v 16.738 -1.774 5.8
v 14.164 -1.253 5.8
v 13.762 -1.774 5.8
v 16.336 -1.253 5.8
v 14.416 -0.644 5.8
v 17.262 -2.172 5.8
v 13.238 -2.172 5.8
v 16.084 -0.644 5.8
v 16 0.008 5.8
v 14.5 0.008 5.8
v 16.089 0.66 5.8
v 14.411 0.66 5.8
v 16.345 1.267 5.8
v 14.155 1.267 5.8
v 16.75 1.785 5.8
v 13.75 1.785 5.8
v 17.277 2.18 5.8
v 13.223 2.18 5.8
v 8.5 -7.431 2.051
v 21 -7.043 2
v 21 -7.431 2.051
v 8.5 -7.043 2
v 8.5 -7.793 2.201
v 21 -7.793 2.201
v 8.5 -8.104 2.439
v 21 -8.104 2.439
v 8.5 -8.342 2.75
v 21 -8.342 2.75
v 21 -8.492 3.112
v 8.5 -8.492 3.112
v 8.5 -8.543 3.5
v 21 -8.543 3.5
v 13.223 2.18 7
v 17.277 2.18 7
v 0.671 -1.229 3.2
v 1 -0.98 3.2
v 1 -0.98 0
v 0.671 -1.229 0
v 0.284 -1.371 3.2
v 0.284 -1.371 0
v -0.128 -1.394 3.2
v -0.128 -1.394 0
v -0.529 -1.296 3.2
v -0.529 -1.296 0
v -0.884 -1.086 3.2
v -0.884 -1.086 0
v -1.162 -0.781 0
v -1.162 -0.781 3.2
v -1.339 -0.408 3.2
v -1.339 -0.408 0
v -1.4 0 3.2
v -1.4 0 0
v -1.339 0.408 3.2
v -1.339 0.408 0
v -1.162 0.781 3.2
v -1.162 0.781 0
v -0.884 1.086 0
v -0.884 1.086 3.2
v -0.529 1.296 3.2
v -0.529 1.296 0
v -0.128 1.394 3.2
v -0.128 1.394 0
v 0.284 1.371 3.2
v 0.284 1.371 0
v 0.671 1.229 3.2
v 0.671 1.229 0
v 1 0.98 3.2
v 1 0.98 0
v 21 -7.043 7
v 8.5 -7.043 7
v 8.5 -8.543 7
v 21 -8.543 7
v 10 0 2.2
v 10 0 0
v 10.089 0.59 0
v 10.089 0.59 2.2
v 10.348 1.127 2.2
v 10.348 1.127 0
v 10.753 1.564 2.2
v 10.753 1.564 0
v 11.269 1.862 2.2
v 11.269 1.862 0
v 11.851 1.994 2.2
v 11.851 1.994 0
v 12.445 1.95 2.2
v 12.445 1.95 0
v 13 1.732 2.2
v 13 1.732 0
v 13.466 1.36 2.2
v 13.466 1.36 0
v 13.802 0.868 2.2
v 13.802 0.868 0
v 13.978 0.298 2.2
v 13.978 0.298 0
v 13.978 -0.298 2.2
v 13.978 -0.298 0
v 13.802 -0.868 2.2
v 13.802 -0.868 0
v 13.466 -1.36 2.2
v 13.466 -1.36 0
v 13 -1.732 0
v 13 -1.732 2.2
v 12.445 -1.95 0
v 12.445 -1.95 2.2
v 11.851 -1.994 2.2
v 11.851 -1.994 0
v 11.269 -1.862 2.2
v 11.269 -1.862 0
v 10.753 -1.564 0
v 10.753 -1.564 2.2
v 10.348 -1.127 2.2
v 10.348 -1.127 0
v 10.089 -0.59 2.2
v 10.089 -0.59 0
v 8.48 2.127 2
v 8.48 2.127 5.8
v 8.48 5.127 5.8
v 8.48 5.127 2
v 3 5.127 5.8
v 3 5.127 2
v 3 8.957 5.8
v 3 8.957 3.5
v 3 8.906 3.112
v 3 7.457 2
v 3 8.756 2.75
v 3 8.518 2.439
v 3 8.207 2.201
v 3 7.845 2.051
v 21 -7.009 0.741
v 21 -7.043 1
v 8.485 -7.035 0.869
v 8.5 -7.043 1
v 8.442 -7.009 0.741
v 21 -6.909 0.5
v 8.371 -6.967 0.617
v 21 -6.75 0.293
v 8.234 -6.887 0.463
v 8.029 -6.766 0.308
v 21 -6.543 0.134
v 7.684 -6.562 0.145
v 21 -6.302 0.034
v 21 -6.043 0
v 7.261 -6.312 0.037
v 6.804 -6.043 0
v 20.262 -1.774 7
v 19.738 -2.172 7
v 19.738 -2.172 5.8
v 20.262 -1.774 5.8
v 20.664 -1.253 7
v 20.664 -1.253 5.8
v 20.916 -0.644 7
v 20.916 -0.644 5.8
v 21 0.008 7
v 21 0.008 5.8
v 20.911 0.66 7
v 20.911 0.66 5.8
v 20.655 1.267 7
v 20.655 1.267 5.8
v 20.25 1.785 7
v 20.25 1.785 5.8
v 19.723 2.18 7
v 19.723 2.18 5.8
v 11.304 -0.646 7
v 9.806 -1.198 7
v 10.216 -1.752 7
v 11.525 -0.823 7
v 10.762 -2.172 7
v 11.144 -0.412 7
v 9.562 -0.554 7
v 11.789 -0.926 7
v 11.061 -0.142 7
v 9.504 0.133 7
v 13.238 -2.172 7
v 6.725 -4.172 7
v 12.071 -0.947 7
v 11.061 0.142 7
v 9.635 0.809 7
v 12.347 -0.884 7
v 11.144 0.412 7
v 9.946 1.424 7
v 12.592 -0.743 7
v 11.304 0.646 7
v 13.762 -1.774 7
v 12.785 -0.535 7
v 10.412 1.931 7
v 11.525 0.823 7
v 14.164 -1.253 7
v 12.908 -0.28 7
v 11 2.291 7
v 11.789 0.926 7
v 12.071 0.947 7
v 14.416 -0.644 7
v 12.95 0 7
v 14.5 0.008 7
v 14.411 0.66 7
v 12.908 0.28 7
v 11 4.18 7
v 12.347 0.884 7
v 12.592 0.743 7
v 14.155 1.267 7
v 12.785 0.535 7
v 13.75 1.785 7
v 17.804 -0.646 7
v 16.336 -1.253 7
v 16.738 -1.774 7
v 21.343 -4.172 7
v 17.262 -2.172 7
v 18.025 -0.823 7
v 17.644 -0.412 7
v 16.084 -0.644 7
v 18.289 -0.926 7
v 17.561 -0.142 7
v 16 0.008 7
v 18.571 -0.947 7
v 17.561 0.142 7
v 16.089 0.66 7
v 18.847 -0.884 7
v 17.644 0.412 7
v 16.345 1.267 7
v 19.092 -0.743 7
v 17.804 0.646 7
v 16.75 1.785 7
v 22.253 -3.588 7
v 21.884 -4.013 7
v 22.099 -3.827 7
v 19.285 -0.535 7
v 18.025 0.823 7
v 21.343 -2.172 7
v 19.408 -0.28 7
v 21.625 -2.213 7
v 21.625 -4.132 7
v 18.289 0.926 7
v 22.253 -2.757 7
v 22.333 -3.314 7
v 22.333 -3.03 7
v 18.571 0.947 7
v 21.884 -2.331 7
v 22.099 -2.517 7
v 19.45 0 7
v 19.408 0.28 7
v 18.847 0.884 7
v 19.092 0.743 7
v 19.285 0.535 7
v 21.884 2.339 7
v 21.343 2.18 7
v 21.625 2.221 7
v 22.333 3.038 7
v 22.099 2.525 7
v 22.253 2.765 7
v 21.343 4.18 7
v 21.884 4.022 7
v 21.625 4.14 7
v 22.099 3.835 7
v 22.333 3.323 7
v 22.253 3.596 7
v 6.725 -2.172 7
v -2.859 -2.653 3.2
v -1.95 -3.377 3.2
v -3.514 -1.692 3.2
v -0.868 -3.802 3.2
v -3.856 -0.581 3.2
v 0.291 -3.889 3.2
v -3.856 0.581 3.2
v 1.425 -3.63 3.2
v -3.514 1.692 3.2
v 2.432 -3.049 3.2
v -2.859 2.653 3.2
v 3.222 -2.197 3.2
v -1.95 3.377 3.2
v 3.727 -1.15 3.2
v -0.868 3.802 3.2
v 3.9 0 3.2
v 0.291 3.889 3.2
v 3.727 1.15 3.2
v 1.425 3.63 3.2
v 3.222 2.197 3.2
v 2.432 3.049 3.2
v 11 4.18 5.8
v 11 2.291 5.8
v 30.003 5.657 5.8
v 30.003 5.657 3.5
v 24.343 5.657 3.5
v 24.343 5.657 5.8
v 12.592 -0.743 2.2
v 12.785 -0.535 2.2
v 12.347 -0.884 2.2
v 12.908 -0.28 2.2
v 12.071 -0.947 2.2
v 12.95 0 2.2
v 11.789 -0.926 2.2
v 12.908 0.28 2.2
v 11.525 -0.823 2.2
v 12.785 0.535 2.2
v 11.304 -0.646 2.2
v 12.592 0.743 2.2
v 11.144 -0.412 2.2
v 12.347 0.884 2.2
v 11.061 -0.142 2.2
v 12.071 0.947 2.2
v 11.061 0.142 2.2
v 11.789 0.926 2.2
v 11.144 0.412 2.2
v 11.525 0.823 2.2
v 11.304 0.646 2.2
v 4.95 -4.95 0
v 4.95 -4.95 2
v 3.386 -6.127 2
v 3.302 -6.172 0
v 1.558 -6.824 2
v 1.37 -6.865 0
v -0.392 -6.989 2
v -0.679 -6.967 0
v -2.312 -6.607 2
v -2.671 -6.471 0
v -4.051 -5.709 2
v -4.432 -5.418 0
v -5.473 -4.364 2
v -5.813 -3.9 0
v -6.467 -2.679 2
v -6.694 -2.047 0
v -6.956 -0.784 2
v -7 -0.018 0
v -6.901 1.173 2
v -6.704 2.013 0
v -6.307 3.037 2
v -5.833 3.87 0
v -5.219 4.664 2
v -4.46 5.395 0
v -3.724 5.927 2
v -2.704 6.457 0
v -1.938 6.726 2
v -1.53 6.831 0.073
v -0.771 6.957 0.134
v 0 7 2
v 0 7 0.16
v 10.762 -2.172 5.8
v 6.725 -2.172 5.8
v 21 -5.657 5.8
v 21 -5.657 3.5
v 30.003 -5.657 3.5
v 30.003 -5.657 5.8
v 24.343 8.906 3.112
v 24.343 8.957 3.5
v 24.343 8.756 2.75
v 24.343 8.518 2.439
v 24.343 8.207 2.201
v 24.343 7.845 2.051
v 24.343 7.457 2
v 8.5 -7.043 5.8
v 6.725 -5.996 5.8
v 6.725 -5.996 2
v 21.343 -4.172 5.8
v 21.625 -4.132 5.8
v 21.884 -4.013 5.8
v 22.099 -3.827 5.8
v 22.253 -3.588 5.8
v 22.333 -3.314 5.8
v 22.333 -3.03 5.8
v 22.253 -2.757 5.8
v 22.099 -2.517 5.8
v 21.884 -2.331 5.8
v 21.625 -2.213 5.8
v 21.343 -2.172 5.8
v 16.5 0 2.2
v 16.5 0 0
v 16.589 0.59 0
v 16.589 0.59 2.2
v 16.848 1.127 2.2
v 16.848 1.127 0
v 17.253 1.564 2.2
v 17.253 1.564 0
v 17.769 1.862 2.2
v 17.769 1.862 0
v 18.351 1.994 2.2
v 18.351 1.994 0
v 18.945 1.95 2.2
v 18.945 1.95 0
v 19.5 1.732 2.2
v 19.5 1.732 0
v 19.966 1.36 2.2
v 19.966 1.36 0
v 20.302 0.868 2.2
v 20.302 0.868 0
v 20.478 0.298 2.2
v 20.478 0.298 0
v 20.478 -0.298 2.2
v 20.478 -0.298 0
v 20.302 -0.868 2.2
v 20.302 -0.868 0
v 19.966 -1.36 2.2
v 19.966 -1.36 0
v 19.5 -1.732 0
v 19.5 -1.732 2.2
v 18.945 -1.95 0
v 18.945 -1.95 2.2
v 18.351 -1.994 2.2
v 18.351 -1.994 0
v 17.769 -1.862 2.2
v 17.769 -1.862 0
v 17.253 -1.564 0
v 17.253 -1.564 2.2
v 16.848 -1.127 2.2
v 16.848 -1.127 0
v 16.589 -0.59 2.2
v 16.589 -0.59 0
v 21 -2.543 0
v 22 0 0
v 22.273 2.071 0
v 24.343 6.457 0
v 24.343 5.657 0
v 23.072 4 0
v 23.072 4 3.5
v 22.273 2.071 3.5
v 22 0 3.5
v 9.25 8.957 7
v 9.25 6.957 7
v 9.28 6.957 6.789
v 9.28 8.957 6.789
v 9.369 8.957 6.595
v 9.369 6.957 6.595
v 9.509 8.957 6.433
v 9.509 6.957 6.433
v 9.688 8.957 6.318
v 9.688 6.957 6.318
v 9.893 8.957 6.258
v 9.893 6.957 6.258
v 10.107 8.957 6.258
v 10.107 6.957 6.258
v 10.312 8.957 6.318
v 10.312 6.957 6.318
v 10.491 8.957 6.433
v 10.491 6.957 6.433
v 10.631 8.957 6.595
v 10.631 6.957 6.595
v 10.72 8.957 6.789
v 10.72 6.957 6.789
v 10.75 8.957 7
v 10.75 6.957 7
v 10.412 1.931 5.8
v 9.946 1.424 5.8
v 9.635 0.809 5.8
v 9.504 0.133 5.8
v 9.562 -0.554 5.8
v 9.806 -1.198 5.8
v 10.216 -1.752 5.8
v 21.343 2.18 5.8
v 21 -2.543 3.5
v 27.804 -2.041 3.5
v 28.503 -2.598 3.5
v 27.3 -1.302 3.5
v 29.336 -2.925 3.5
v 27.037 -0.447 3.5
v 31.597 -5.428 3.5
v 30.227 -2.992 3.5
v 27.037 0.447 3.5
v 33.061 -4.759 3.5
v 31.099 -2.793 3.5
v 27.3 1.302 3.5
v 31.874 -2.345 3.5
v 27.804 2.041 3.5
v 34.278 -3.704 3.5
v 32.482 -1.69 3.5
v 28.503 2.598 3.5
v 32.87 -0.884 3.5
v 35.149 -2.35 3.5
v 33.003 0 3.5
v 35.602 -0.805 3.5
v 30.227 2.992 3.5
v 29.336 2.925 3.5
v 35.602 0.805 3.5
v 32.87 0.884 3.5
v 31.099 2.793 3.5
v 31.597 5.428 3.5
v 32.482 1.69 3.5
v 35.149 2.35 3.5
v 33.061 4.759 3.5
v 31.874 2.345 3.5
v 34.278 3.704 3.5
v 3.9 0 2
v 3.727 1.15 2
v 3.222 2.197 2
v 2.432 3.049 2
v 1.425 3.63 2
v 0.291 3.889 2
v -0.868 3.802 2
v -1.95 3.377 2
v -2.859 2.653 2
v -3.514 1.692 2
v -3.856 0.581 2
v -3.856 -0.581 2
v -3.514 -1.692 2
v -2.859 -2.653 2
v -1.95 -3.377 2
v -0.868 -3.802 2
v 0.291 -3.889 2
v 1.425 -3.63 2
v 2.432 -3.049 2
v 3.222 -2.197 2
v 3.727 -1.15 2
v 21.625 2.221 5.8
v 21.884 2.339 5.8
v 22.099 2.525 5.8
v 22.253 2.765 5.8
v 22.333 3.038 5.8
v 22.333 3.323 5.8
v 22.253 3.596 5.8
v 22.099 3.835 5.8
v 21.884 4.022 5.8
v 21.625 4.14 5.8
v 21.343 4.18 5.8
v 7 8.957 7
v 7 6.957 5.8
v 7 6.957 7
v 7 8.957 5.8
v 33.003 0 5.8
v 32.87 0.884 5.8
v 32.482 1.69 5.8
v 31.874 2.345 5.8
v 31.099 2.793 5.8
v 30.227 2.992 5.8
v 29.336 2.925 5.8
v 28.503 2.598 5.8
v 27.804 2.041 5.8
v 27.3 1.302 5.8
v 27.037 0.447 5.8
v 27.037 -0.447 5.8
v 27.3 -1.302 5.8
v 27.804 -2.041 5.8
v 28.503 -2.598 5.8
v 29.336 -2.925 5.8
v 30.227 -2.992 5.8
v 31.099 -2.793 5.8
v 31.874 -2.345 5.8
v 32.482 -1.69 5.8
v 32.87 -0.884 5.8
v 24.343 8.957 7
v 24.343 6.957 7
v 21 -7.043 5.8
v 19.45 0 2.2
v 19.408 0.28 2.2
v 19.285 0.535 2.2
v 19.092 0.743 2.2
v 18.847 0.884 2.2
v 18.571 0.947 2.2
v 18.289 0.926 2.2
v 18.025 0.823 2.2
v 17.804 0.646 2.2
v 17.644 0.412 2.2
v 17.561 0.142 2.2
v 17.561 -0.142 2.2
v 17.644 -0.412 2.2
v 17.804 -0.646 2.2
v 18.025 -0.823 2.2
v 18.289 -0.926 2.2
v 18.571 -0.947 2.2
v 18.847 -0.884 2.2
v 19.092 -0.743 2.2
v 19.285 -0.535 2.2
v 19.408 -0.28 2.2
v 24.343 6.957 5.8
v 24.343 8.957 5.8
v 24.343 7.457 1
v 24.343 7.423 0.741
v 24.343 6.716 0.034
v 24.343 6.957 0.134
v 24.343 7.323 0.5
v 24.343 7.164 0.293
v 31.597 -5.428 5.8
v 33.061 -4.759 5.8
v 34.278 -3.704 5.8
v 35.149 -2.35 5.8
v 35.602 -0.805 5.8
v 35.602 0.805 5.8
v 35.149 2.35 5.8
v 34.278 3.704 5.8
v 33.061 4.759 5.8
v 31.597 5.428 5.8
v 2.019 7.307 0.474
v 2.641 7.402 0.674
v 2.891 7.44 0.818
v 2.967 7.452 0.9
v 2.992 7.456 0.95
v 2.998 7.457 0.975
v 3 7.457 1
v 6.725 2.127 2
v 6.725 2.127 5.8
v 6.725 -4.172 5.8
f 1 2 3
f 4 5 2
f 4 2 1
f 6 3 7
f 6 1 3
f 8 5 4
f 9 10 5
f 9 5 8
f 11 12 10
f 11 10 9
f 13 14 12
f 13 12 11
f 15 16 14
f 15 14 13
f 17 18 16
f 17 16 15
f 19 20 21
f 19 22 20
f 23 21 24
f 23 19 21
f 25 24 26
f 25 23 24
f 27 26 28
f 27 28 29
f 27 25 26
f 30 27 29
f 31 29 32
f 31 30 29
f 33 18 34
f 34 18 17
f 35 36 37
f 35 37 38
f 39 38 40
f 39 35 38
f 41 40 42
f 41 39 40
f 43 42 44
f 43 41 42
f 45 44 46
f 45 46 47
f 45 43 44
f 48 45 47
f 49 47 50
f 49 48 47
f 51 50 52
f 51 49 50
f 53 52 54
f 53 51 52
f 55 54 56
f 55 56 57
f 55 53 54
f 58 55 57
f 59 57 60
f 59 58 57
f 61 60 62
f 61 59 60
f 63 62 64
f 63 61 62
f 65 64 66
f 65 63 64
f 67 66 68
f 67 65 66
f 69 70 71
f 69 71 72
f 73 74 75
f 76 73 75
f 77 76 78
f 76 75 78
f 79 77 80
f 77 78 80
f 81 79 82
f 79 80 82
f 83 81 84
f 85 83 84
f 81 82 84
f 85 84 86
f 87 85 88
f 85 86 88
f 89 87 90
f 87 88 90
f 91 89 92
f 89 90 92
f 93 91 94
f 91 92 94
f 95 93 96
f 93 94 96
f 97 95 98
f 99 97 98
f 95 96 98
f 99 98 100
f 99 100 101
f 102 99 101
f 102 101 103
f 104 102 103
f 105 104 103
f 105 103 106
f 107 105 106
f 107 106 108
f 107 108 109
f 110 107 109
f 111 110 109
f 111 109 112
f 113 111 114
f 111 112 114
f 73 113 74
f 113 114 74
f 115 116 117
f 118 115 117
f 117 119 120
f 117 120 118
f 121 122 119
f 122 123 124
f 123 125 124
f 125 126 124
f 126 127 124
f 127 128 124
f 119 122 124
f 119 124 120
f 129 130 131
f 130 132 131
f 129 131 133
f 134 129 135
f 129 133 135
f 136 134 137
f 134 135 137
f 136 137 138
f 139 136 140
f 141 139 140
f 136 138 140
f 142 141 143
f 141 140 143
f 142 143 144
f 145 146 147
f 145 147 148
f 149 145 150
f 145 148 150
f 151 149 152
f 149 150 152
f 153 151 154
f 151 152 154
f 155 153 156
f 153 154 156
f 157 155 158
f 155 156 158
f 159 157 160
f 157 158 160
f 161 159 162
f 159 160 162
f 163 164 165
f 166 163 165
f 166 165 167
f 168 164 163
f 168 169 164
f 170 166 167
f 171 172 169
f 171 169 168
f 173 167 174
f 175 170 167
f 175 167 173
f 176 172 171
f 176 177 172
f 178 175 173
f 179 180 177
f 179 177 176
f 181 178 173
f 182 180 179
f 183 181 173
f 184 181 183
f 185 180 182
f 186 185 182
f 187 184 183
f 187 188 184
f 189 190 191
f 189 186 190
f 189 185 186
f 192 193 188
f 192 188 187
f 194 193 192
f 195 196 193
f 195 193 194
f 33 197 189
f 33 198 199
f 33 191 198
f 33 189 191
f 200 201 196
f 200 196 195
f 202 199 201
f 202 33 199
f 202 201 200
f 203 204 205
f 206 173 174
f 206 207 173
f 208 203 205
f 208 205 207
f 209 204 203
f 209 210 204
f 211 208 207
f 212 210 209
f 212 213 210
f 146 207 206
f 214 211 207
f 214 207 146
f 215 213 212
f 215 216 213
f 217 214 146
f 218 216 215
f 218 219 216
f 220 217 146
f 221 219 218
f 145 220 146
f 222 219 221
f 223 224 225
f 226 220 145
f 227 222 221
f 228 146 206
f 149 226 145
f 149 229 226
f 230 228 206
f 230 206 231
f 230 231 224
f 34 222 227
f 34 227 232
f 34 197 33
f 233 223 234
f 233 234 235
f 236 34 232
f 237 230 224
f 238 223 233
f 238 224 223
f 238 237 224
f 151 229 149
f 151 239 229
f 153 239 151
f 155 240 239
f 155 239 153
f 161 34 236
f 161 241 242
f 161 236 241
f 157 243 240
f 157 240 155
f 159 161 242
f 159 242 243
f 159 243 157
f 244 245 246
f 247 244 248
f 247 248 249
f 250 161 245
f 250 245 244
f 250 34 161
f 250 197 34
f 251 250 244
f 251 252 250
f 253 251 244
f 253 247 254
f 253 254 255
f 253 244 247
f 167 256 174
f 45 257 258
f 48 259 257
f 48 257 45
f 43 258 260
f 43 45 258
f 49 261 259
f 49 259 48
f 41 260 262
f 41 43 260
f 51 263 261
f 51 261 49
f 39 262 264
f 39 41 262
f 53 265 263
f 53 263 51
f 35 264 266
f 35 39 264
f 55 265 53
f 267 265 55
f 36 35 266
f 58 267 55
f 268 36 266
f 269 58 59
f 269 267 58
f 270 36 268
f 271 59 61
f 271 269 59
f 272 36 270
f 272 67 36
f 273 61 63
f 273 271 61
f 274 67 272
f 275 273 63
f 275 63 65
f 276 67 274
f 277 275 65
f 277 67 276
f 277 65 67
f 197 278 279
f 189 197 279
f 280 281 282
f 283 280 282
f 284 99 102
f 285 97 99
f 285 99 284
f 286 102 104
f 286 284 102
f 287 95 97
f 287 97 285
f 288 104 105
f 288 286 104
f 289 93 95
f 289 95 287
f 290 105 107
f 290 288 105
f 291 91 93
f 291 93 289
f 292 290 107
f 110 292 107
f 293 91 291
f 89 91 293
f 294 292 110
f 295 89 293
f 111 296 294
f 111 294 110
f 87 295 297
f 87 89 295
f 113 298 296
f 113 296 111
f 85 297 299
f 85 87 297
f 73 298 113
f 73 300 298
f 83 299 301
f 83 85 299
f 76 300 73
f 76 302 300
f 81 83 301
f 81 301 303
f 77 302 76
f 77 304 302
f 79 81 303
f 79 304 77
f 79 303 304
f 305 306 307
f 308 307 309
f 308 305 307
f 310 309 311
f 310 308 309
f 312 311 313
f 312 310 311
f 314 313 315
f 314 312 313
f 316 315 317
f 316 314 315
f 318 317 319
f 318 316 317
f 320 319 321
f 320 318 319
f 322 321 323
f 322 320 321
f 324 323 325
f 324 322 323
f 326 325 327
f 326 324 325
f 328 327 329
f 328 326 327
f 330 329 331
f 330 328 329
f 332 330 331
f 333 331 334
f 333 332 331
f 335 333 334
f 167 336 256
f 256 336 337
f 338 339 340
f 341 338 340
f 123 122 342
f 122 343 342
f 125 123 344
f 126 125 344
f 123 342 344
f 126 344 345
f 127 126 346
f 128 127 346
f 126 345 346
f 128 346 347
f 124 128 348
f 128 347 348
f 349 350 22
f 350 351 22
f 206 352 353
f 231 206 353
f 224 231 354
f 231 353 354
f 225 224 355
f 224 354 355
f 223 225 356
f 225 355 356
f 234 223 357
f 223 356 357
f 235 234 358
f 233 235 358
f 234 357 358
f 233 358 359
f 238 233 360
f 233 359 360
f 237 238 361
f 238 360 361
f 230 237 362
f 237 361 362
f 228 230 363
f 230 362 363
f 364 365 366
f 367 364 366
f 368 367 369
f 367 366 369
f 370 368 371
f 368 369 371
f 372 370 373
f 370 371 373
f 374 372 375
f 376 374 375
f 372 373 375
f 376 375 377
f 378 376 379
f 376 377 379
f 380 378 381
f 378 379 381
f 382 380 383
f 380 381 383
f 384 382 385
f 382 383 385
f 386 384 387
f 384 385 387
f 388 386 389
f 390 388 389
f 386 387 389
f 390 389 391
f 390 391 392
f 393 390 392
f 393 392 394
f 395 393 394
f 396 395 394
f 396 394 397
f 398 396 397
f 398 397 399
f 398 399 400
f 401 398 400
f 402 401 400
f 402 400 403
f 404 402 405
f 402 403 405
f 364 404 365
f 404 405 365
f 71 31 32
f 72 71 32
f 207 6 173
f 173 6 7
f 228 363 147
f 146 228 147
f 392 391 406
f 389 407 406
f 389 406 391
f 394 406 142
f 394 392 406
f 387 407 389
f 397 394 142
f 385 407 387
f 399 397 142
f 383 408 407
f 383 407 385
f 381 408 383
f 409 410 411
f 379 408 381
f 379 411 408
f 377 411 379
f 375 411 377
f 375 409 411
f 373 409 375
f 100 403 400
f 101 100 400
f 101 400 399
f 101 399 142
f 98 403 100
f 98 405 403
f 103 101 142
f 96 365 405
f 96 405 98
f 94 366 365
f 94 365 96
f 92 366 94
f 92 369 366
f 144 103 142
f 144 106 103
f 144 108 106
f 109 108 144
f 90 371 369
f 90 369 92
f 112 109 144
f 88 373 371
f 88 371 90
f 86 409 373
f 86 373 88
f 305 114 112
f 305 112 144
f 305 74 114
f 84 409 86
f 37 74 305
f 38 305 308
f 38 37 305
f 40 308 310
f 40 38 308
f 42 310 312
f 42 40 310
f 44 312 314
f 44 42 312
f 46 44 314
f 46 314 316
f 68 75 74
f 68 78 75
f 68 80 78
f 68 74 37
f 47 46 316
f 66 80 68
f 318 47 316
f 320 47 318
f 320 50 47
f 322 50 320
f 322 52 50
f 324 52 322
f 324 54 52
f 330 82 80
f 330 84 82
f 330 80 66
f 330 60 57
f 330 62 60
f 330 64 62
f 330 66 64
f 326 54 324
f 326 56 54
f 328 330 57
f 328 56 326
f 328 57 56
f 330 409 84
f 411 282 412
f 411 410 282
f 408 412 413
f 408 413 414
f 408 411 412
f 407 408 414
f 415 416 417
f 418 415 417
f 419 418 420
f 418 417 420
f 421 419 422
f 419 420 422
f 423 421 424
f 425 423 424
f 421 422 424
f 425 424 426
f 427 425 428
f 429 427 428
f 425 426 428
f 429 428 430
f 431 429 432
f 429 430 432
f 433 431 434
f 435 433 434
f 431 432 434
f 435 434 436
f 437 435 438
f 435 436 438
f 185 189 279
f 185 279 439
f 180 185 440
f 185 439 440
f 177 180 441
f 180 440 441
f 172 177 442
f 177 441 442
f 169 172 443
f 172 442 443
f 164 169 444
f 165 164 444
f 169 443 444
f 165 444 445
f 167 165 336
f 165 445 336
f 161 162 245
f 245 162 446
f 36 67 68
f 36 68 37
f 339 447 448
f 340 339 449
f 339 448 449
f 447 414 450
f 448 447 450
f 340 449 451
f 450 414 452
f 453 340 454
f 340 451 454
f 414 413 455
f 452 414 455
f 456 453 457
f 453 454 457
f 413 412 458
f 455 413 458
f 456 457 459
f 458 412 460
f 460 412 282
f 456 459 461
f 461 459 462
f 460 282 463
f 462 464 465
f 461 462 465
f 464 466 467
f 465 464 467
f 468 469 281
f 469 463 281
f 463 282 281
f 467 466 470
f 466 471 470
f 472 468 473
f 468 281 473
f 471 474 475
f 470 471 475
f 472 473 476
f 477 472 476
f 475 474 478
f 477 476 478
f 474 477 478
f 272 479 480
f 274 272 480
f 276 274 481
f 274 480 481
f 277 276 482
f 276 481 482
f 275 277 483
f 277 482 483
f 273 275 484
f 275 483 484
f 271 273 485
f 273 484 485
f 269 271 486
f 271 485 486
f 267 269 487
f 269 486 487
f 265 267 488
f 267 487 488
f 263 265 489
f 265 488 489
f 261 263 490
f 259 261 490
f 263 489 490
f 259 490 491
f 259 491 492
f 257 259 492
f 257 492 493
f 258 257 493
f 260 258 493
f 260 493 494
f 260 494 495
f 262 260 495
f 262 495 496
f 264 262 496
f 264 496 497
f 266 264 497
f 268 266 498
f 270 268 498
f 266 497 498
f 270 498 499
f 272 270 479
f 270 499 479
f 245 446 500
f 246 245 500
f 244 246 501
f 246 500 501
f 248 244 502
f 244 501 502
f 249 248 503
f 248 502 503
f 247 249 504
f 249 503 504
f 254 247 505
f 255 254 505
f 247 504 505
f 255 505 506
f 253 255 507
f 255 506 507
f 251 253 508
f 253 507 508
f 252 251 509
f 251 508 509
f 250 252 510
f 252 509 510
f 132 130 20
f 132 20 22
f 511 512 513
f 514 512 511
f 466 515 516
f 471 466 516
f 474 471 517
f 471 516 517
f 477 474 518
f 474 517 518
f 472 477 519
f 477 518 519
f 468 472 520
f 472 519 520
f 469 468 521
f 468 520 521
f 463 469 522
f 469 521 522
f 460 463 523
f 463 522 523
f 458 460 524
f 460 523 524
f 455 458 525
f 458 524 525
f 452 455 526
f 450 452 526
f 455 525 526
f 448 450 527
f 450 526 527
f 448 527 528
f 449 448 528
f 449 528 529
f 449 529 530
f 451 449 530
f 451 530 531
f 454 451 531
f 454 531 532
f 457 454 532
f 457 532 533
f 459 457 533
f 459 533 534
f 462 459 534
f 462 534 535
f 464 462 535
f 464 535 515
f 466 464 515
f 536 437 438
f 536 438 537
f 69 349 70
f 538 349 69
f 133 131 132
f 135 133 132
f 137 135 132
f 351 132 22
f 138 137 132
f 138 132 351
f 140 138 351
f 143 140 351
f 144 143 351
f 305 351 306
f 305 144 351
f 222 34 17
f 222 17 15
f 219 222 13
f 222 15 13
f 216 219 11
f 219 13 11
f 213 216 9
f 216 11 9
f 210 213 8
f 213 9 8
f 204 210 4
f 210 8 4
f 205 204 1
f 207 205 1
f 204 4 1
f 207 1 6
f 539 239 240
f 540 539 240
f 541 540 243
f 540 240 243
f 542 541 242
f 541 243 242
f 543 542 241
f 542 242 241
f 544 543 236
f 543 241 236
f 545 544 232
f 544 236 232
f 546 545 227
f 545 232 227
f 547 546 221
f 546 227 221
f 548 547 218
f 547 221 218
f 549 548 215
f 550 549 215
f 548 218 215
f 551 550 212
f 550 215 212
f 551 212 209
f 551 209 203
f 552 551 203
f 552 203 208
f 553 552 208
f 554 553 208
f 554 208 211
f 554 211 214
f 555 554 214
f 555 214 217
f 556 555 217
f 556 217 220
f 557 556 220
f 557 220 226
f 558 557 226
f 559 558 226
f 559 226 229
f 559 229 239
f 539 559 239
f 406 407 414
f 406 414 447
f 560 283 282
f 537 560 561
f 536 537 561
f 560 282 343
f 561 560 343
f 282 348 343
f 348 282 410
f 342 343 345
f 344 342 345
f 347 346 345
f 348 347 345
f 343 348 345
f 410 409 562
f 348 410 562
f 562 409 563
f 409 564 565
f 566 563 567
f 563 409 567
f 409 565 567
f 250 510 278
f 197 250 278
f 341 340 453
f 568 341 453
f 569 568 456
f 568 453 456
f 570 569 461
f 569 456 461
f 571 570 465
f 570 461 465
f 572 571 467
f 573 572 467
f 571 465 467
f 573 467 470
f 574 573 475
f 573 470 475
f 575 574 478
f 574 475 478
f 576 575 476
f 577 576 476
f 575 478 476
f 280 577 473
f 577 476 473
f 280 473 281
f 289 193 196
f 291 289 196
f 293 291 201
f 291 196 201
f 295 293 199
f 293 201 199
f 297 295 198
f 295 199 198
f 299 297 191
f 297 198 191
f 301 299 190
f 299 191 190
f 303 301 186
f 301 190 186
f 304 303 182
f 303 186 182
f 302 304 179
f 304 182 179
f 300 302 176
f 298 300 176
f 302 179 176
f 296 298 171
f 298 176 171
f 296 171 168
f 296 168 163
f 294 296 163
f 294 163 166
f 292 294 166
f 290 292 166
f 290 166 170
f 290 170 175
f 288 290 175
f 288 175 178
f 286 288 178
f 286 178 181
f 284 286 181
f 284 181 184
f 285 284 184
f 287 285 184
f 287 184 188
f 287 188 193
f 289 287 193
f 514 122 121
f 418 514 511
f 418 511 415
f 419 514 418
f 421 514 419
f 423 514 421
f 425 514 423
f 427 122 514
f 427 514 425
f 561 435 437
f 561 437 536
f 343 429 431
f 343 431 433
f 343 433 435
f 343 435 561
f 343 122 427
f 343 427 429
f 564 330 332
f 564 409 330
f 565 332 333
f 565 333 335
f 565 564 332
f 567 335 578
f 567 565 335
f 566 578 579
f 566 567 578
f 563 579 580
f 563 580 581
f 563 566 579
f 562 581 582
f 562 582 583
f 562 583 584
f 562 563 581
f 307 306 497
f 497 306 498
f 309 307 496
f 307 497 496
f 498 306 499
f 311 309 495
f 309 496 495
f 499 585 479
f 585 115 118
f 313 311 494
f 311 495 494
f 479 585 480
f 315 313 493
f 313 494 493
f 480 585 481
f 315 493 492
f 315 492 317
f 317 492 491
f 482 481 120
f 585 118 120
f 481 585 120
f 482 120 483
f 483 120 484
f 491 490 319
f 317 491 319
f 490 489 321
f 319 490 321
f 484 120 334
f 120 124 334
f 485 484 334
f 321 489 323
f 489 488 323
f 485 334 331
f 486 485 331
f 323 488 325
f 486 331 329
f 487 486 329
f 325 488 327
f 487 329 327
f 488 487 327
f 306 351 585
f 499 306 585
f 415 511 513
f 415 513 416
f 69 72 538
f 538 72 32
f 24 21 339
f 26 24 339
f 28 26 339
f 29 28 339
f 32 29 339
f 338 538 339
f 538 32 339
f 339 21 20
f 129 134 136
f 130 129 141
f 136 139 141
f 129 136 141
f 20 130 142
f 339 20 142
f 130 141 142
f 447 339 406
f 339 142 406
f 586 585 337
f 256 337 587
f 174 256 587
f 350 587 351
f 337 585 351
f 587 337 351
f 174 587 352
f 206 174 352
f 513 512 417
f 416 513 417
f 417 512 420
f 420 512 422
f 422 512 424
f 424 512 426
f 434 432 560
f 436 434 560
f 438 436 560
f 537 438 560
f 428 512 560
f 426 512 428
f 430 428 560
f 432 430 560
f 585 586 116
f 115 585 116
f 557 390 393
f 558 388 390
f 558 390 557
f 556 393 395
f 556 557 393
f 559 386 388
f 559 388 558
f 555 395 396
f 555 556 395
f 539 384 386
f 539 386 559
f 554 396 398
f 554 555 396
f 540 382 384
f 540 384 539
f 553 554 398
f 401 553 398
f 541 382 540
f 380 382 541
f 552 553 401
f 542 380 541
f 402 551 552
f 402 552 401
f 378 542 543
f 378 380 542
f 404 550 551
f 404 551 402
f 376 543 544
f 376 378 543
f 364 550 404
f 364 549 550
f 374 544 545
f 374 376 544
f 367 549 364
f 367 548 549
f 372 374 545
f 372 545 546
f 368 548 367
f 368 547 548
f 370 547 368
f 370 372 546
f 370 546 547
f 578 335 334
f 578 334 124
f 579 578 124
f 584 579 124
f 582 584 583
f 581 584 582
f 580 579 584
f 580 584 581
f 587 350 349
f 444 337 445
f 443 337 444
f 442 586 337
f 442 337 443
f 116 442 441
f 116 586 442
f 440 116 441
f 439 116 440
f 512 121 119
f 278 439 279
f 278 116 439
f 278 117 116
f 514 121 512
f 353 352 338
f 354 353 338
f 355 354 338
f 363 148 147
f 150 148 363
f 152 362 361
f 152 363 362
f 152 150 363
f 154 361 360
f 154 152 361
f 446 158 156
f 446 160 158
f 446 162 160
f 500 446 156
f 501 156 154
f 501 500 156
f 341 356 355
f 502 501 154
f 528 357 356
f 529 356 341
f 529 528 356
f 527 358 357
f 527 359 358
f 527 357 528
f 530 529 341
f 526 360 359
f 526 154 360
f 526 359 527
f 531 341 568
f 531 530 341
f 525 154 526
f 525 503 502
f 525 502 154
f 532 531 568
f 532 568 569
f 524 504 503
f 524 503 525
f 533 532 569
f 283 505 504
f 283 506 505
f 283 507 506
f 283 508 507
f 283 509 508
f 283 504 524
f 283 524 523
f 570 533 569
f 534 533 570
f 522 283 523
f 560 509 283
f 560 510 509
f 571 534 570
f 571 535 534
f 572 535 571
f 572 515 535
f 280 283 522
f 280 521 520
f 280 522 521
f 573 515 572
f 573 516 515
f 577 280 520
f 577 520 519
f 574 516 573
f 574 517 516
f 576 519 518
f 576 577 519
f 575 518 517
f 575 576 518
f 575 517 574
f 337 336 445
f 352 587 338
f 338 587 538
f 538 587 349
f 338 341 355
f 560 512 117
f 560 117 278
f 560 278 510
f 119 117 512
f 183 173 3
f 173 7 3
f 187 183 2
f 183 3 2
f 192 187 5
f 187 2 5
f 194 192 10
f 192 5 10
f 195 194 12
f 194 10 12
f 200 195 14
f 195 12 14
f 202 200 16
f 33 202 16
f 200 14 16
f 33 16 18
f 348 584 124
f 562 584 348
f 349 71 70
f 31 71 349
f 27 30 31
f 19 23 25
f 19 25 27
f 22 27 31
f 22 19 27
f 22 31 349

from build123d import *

# Parameters (mm, degrees)
BOSS_EXTRUDE1_DEPTH = 2
BOSS_EXTRUDE2_DEPTH = 1.5
BOSS_EXTRUDE3_DEPTH = 2.3
SKETCH6_W           = 5.48
SKETCH6_H           = 3
CUT_EXTRUDE1_DEPTH  = 3.8
SKETCH7_R           = 3
CUT_EXTRUDE2_DEPTH  = 3.3
SKETCH8_W           = 17.343145751
SKETCH8_H           = 2
SKETCH8_W_2         = 12.500252532
SKETCH8_H_2         = 1.5
BOSS_EXTRUDE4_DEPTH = 1.2
SKETCH9_R           = 2.5
BOSS_EXTRUDE5_DEPTH = 1.2
SKETCH10_R          = 0.95
CUT_EXTRUDE3_DEPTH  = 8.2
SKETCH11_R          = 2
CUT_EXTRUDE4_DEPTH  = 2.2
SKETCH12_R          = 3.9
BOSS_EXTRUDE6_DEPTH = 1.2
CUT_EXTRUDE5_DEPTH  = 3.2
FILLET1_R           = 1.5
FILLET2_R           = 1
SKETCH15_R          = 0.75
CUT_EXTRUDE6_DEPTH  = 4


with BuildPart() as part:
    # Sketch2 → Boss-Extrude1 (new body)
    with BuildSketch(Plane.XY):
        with BuildLine():
            Line((0, 7), (3, 7.456854249))
            Line((3, 7.456854249), (24.343145751, 7.456854249))
            Line((24.343145751, 7.456854249), (24.343145751, 5.656854249))
            ThreePointArc((24.343145751, 5.656854249), (22.60896374, 3.061467459), (22, 0))
            Line((22, 0), (21, -2.543145751))
            Line((21, -2.543145751), (21, -7.043145751))
            Line((21, -7.043145751), (8.499747468, -7.043145751))
            Line((8.499747468, -7.043145751), (4.949747468, -4.949747468))
            ThreePointArc((4.949747468, -4.949747468), (-6.467156728, -2.678784027), (0, 7))
        make_face()
    extrude(amount=BOSS_EXTRUDE1_DEPTH)

    # Sketch3 → Boss-Extrude2 (add)
    with BuildSketch(Plane.XY.offset(2)):
        with BuildLine():
            Line((24.343145751, 7.456854249), (24.343145751, 5.656854249))
            ThreePointArc((24.343145751, 5.656854249), (22.60896374, 3.061467459), (22, 0))
            Line((22, 0), (21, -2.543145751))
            Line((21, -2.543145751), (21, -7.043145751))
            Line((21, -7.043145751), (21, -8.543145751))
            Line((21, -8.543145751), (8.499747468, -8.543145751))
            Line((8.499747468, -8.543145751), (8.499747468, -7.043145751))
            Line((8.499747468, -7.043145751), (6.724747468, -5.996446609))
            Line((6.724747468, -5.996446609), (6.724747468, 2.126854249))
            Line((6.724747468, 2.126854249), (3, 2.126854249))
            Line((3, 2.126854249), (3, 7.456854249))
            Line((3, 7.456854249), (3, 8.956854249))
            Line((3, 8.956854249), (24.343145751, 8.956854249))
            Line((24.343145751, 8.956854249), (24.343145751, 7.456854249))
        make_face()
    extrude(amount=BOSS_EXTRUDE2_DEPTH)

    # Sketch5 → Boss-Extrude3 (add)
    with BuildSketch(Plane.XY.offset(3.5)):
        with BuildLine():
            Line((3, 7.5), (3, 2.126854249))
            Line((3, 2.126854249), (6.724747468, 2.126854249))
            Line((6.724747468, 2.126854249), (6.724747468, -5.996446609))
            Line((6.724747468, -5.996446609), (8.499747468, -7.043145751))
            Line((8.499747468, -7.043145751), (8.499747468, -8.543145751))
            Line((8.499747468, -8.543145751), (21, -8.543145751))
            Line((21, -8.543145751), (21, -5.656854249))
            Line((21, -5.656854249), (30.003145751, -5.656854249))
            ThreePointArc((30.003145751, -5.656854249), (35.66, 0), (30.003145751, 5.656854249))
            Line((30.003145751, 5.656854249), (24.343145751, 5.656854249))
            Line((24.343145751, 5.656854249), (24.343145751, 7.5))
            Line((24.343145751, 7.5), (24.343145751, 8.956854249))
            Line((24.343145751, 8.956854249), (3, 8.956854249))
            Line((3, 8.956854249), (3, 7.5))
        make_face()
    extrude(amount=BOSS_EXTRUDE3_DEPTH)

    # Sketch6 → Cut-Extrude1 (cut)
    with BuildSketch(Plane.XY.offset(5.8)):
        with Locations((5.74, 3.626854249)):
            Rectangle(SKETCH6_W, SKETCH6_H)
    extrude(amount=-CUT_EXTRUDE1_DEPTH, mode=Mode.SUBTRACT)

    # Sketch7 → Cut-Extrude2 (cut)
    with BuildSketch(Plane.XY.offset(5.8)):
        with Locations((30.003145751, 0)):
            Circle(SKETCH7_R)
    extrude(amount=-CUT_EXTRUDE2_DEPTH, mode=Mode.SUBTRACT)

    # Sketch8 → Boss-Extrude4 (add)
    with BuildSketch(Plane.XY.offset(5.8)):
        with Locations((15.671572876, 7.956854249)):
            Rectangle(SKETCH8_W, SKETCH8_H)
        with Locations((14.749873734, -7.793145751)):
            Rectangle(SKETCH8_W_2, SKETCH8_H_2)
        with BuildLine():
            Line((6.724747468, -4.172114809), (21.343145751, -4.172114809))
            ThreePointArc((21.343145751, -4.172114809), (22.343145751, -3.172114809), (21.343145751, -2.172114809))
            Line((21.343145751, -2.172114809), (6.724747468, -2.172114809))
            Line((6.724747468, -2.172114809), (6.724747468, -4.172114809))
        make_face()
        with BuildLine():
            Line((21.343145751, 4.180295218), (11, 4.180295218))
            Line((11, 4.180295218), (11, 2.180295218))
            Line((11, 2.180295218), (21.343145751, 2.180295218))
            ThreePointArc((21.343145751, 2.180295218), (22.343145751, 3.180295218), (21.343145751, 4.180295218))
        make_face()
    extrude(amount=BOSS_EXTRUDE4_DEPTH)

    # Sketch9 → Boss-Extrude5 (add)
    with BuildSketch(Plane.XY.offset(5.8)):
        with Locations((18.5, 0)):
            Circle(SKETCH9_R)
        with Locations((12, 0)):
            Circle(SKETCH9_R)
    extrude(amount=BOSS_EXTRUDE5_DEPTH)

    # Sketch10 → Cut-Extrude3 (cut)
    with BuildSketch(Plane.XY.offset(7)):
        with Locations((18.5, 0)):
            Circle(SKETCH10_R)
        with Locations((12, 0)):
            Circle(SKETCH10_R)
    extrude(amount=-CUT_EXTRUDE3_DEPTH, mode=Mode.SUBTRACT)

    # Sketch11 → Cut-Extrude4 (cut)
    with BuildSketch(Plane(origin=(0, 0, 0), x_dir=(-1, 0, 0), z_dir=(0, 0, -1))):
        with Locations((-12, 0)):
            Circle(SKETCH11_R)
        with Locations((-18.5, 0)):
            Circle(SKETCH11_R)
    extrude(amount=-CUT_EXTRUDE4_DEPTH, mode=Mode.SUBTRACT)

    # Sketch12 → Boss-Extrude6 (add)
    with BuildSketch(Plane.XY.offset(2)):
        Circle(SKETCH12_R)
    extrude(amount=BOSS_EXTRUDE6_DEPTH)

    # Sketch14 → Cut-Extrude5 (cut)
    with BuildSketch(Plane.XY.offset(3.2)):
        with BuildLine():
            Line((1, 0.979795897), (1, -0.979795897))
            ThreePointArc((1, -0.979795897), (-1.4, 0), (1, 0.979795897))
        make_face()
    extrude(amount=-CUT_EXTRUDE5_DEPTH, mode=Mode.SUBTRACT)

    # Fillet1
    fillet1_edges = [part.edges().sort_by_distance(p)[0] for p in [
        (13.671572875, 8.956854249, 2),
        (14.749873734, -8.543145751, 2),
    ]]
    fillet(fillet1_edges, radius=FILLET1_R - 0.0001)  # a hair under: the kernel refuses the full size

    # Fillet2
    fillet2_edges = [part.edges().sort_by_distance(p)[0] for p in [
        (14.749873734, -7.043145751, 0),
        (13.671572875, 7.456854249, 0),
    ]]
    fillet(fillet2_edges, radius=FILLET2_R)

    # Sketch15 → Cut-Extrude6 (cut)
    with BuildSketch(Plane.XZ.offset(-6.956854249)):
        with Locations((10, 7)):
            Circle(SKETCH15_R)
    extrude(amount=-CUT_EXTRUDE6_DEPTH, mode=Mode.SUBTRACT)


solid = part.part
